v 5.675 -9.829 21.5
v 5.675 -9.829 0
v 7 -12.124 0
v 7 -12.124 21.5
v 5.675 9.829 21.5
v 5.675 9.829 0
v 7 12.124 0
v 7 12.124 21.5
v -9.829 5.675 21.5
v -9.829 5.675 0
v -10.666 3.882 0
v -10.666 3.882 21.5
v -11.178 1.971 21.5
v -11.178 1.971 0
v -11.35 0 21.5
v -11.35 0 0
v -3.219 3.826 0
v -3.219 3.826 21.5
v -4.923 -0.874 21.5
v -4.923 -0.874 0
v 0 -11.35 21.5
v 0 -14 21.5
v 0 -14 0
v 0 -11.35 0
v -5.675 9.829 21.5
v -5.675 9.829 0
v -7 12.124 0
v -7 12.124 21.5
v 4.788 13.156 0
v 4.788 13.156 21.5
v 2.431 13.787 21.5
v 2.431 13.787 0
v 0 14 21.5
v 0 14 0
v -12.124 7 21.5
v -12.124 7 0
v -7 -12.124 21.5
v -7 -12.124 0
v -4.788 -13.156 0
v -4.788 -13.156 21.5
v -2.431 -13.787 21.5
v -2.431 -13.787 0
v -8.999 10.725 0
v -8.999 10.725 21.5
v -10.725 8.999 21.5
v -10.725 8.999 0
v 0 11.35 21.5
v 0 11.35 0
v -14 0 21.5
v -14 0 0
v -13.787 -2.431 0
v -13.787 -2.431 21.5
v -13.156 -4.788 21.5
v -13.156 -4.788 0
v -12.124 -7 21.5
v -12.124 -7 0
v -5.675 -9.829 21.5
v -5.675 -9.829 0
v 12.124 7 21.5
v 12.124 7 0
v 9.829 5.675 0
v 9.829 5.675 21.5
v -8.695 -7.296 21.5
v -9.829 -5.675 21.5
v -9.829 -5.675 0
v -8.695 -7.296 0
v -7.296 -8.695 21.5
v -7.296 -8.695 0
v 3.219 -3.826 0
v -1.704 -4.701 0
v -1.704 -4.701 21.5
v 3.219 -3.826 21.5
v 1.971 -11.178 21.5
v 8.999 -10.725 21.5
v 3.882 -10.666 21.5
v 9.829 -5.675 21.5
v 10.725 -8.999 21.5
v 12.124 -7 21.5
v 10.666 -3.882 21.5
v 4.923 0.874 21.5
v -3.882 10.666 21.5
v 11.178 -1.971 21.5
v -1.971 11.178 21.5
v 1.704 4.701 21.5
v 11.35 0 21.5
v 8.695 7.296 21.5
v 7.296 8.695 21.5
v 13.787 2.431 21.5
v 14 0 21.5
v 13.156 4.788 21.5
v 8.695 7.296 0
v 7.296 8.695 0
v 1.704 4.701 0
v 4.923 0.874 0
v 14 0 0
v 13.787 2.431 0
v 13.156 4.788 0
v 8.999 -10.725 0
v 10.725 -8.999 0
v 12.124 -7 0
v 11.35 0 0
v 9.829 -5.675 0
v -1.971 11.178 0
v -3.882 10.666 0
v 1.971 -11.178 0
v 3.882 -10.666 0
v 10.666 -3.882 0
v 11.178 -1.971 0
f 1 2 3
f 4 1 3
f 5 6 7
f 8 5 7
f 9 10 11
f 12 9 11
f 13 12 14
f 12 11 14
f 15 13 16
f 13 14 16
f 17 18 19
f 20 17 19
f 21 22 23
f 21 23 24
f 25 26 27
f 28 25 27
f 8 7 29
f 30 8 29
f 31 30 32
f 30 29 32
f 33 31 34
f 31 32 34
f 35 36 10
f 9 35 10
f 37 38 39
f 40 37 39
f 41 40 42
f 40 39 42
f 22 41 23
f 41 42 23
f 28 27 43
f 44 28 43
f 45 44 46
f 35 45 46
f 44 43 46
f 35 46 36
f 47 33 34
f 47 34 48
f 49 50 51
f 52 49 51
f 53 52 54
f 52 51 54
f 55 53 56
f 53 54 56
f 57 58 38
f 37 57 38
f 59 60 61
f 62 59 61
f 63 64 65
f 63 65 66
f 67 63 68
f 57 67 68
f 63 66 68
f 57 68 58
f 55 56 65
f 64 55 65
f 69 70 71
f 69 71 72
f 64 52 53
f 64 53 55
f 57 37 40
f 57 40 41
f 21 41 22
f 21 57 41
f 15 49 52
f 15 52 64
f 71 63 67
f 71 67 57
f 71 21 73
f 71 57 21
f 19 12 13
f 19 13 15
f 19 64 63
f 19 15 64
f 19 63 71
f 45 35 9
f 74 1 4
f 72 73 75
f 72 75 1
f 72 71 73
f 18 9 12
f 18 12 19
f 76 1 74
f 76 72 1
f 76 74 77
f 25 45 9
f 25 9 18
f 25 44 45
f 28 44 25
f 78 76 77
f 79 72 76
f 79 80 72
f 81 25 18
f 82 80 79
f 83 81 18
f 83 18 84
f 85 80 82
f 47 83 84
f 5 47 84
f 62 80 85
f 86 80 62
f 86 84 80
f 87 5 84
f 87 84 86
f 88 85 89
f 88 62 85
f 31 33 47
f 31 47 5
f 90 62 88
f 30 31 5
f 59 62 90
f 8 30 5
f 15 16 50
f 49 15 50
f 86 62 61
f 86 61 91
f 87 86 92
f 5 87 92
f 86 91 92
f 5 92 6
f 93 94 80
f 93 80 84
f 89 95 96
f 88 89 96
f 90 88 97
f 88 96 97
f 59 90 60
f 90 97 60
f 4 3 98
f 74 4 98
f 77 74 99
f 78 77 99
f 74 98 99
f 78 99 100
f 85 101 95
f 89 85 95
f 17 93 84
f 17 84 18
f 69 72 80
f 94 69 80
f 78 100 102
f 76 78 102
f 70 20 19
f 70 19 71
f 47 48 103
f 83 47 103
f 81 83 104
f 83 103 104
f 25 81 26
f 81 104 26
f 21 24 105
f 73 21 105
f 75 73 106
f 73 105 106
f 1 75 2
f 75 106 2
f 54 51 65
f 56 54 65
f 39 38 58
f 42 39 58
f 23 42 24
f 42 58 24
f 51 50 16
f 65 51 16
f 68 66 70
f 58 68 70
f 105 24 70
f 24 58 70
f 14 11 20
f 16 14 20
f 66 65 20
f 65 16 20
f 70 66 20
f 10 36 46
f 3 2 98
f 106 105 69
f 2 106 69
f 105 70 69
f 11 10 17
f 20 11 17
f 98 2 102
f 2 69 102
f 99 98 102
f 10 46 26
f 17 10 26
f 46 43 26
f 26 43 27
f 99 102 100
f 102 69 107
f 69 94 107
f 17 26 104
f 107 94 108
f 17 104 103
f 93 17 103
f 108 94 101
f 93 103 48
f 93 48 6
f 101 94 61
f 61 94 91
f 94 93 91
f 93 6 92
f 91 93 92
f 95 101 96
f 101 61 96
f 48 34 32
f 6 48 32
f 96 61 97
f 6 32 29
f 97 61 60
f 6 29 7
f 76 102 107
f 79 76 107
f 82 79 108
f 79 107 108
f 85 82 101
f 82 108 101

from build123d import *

# Parameters (mm, degrees)
DODANIE_WYCI_GNI_CIE1_DEPTH = 21.5


with BuildPart() as part:
    # Szkic1 → Dodanie-wyciągnięcie1 (new body)
    with BuildSketch(Plane.XY):
        with BuildLine():
            Line((0, 14), (0, 11.35))
            ThreePointArc((0, 11.35), (-2.937596162, 10.963258128), (-5.675, 9.829388333))
            Line((-5.675, 9.829388333), (-7, 12.124355653))
            ThreePointArc((-7, 12.124355653), (-9.899494937, 9.899494937), (-12.124355653, 7))
            Line((-12.124355653, 7), (-9.829388333, 5.675))
            ThreePointArc((-9.829388333, 5.675), (-10.963258128, 2.937596162), (-11.35, 0))
            Line((-11.35, 0), (-14, 0))
            ThreePointArc((-14, 0), (-13.522961568, -3.623466631), (-12.124355653, -7))
            Line((-12.124355653, -7), (-9.829388333, -5.675))
            ThreePointArc((-9.829388333, -5.675), (-8.025661966, -8.025661966), (-5.675, -9.829388333))
            Line((-5.675, -9.829388333), (-7, -12.124355653))
            ThreePointArc((-7, -12.124355653), (-3.623466631, -13.522961568), (0, -14))
            Line((0, -14), (0, -11.35))
            ThreePointArc((0, -11.35), (2.937596162, -10.963258128), (5.675, -9.829388333))
            Line((5.675, -9.829388333), (7, -12.124355653))
            ThreePointArc((7, -12.124355653), (9.899494937, -9.899494937), (12.124355653, -7))
            Line((12.124355653, -7), (9.829388333, -5.675))
            ThreePointArc((9.829388333, -5.675), (10.963258128, -2.937596162), (11.35, 0))
            Line((11.35, 0), (14, 0))
            ThreePointArc((14, 0), (13.522961568, 3.623466631), (12.124355653, 7))
            Line((12.124355653, 7), (9.829388333, 5.675))
            ThreePointArc((9.829388333, 5.675), (8.025661966, 8.025661966), (5.675, 9.829388333))
            Line((5.675, 9.829388333), (7, 12.124355653))
            ThreePointArc((7, 12.124355653), (3.623466631, 13.522961568), (0, 14))
        make_face()
        Polygon((4.922995461, 0.874137115), (1.704472782, 4.700507689), (-3.218522678, 3.826370574), (-4.922995461, -0.874137115), (-1.704472782, -4.700507689), (3.218522678, -3.826370574), align=None, mode=Mode.SUBTRACT)
    extrude(amount=DODANIE_WYCI_GNI_CIE1_DEPTH)


solid = part.part
